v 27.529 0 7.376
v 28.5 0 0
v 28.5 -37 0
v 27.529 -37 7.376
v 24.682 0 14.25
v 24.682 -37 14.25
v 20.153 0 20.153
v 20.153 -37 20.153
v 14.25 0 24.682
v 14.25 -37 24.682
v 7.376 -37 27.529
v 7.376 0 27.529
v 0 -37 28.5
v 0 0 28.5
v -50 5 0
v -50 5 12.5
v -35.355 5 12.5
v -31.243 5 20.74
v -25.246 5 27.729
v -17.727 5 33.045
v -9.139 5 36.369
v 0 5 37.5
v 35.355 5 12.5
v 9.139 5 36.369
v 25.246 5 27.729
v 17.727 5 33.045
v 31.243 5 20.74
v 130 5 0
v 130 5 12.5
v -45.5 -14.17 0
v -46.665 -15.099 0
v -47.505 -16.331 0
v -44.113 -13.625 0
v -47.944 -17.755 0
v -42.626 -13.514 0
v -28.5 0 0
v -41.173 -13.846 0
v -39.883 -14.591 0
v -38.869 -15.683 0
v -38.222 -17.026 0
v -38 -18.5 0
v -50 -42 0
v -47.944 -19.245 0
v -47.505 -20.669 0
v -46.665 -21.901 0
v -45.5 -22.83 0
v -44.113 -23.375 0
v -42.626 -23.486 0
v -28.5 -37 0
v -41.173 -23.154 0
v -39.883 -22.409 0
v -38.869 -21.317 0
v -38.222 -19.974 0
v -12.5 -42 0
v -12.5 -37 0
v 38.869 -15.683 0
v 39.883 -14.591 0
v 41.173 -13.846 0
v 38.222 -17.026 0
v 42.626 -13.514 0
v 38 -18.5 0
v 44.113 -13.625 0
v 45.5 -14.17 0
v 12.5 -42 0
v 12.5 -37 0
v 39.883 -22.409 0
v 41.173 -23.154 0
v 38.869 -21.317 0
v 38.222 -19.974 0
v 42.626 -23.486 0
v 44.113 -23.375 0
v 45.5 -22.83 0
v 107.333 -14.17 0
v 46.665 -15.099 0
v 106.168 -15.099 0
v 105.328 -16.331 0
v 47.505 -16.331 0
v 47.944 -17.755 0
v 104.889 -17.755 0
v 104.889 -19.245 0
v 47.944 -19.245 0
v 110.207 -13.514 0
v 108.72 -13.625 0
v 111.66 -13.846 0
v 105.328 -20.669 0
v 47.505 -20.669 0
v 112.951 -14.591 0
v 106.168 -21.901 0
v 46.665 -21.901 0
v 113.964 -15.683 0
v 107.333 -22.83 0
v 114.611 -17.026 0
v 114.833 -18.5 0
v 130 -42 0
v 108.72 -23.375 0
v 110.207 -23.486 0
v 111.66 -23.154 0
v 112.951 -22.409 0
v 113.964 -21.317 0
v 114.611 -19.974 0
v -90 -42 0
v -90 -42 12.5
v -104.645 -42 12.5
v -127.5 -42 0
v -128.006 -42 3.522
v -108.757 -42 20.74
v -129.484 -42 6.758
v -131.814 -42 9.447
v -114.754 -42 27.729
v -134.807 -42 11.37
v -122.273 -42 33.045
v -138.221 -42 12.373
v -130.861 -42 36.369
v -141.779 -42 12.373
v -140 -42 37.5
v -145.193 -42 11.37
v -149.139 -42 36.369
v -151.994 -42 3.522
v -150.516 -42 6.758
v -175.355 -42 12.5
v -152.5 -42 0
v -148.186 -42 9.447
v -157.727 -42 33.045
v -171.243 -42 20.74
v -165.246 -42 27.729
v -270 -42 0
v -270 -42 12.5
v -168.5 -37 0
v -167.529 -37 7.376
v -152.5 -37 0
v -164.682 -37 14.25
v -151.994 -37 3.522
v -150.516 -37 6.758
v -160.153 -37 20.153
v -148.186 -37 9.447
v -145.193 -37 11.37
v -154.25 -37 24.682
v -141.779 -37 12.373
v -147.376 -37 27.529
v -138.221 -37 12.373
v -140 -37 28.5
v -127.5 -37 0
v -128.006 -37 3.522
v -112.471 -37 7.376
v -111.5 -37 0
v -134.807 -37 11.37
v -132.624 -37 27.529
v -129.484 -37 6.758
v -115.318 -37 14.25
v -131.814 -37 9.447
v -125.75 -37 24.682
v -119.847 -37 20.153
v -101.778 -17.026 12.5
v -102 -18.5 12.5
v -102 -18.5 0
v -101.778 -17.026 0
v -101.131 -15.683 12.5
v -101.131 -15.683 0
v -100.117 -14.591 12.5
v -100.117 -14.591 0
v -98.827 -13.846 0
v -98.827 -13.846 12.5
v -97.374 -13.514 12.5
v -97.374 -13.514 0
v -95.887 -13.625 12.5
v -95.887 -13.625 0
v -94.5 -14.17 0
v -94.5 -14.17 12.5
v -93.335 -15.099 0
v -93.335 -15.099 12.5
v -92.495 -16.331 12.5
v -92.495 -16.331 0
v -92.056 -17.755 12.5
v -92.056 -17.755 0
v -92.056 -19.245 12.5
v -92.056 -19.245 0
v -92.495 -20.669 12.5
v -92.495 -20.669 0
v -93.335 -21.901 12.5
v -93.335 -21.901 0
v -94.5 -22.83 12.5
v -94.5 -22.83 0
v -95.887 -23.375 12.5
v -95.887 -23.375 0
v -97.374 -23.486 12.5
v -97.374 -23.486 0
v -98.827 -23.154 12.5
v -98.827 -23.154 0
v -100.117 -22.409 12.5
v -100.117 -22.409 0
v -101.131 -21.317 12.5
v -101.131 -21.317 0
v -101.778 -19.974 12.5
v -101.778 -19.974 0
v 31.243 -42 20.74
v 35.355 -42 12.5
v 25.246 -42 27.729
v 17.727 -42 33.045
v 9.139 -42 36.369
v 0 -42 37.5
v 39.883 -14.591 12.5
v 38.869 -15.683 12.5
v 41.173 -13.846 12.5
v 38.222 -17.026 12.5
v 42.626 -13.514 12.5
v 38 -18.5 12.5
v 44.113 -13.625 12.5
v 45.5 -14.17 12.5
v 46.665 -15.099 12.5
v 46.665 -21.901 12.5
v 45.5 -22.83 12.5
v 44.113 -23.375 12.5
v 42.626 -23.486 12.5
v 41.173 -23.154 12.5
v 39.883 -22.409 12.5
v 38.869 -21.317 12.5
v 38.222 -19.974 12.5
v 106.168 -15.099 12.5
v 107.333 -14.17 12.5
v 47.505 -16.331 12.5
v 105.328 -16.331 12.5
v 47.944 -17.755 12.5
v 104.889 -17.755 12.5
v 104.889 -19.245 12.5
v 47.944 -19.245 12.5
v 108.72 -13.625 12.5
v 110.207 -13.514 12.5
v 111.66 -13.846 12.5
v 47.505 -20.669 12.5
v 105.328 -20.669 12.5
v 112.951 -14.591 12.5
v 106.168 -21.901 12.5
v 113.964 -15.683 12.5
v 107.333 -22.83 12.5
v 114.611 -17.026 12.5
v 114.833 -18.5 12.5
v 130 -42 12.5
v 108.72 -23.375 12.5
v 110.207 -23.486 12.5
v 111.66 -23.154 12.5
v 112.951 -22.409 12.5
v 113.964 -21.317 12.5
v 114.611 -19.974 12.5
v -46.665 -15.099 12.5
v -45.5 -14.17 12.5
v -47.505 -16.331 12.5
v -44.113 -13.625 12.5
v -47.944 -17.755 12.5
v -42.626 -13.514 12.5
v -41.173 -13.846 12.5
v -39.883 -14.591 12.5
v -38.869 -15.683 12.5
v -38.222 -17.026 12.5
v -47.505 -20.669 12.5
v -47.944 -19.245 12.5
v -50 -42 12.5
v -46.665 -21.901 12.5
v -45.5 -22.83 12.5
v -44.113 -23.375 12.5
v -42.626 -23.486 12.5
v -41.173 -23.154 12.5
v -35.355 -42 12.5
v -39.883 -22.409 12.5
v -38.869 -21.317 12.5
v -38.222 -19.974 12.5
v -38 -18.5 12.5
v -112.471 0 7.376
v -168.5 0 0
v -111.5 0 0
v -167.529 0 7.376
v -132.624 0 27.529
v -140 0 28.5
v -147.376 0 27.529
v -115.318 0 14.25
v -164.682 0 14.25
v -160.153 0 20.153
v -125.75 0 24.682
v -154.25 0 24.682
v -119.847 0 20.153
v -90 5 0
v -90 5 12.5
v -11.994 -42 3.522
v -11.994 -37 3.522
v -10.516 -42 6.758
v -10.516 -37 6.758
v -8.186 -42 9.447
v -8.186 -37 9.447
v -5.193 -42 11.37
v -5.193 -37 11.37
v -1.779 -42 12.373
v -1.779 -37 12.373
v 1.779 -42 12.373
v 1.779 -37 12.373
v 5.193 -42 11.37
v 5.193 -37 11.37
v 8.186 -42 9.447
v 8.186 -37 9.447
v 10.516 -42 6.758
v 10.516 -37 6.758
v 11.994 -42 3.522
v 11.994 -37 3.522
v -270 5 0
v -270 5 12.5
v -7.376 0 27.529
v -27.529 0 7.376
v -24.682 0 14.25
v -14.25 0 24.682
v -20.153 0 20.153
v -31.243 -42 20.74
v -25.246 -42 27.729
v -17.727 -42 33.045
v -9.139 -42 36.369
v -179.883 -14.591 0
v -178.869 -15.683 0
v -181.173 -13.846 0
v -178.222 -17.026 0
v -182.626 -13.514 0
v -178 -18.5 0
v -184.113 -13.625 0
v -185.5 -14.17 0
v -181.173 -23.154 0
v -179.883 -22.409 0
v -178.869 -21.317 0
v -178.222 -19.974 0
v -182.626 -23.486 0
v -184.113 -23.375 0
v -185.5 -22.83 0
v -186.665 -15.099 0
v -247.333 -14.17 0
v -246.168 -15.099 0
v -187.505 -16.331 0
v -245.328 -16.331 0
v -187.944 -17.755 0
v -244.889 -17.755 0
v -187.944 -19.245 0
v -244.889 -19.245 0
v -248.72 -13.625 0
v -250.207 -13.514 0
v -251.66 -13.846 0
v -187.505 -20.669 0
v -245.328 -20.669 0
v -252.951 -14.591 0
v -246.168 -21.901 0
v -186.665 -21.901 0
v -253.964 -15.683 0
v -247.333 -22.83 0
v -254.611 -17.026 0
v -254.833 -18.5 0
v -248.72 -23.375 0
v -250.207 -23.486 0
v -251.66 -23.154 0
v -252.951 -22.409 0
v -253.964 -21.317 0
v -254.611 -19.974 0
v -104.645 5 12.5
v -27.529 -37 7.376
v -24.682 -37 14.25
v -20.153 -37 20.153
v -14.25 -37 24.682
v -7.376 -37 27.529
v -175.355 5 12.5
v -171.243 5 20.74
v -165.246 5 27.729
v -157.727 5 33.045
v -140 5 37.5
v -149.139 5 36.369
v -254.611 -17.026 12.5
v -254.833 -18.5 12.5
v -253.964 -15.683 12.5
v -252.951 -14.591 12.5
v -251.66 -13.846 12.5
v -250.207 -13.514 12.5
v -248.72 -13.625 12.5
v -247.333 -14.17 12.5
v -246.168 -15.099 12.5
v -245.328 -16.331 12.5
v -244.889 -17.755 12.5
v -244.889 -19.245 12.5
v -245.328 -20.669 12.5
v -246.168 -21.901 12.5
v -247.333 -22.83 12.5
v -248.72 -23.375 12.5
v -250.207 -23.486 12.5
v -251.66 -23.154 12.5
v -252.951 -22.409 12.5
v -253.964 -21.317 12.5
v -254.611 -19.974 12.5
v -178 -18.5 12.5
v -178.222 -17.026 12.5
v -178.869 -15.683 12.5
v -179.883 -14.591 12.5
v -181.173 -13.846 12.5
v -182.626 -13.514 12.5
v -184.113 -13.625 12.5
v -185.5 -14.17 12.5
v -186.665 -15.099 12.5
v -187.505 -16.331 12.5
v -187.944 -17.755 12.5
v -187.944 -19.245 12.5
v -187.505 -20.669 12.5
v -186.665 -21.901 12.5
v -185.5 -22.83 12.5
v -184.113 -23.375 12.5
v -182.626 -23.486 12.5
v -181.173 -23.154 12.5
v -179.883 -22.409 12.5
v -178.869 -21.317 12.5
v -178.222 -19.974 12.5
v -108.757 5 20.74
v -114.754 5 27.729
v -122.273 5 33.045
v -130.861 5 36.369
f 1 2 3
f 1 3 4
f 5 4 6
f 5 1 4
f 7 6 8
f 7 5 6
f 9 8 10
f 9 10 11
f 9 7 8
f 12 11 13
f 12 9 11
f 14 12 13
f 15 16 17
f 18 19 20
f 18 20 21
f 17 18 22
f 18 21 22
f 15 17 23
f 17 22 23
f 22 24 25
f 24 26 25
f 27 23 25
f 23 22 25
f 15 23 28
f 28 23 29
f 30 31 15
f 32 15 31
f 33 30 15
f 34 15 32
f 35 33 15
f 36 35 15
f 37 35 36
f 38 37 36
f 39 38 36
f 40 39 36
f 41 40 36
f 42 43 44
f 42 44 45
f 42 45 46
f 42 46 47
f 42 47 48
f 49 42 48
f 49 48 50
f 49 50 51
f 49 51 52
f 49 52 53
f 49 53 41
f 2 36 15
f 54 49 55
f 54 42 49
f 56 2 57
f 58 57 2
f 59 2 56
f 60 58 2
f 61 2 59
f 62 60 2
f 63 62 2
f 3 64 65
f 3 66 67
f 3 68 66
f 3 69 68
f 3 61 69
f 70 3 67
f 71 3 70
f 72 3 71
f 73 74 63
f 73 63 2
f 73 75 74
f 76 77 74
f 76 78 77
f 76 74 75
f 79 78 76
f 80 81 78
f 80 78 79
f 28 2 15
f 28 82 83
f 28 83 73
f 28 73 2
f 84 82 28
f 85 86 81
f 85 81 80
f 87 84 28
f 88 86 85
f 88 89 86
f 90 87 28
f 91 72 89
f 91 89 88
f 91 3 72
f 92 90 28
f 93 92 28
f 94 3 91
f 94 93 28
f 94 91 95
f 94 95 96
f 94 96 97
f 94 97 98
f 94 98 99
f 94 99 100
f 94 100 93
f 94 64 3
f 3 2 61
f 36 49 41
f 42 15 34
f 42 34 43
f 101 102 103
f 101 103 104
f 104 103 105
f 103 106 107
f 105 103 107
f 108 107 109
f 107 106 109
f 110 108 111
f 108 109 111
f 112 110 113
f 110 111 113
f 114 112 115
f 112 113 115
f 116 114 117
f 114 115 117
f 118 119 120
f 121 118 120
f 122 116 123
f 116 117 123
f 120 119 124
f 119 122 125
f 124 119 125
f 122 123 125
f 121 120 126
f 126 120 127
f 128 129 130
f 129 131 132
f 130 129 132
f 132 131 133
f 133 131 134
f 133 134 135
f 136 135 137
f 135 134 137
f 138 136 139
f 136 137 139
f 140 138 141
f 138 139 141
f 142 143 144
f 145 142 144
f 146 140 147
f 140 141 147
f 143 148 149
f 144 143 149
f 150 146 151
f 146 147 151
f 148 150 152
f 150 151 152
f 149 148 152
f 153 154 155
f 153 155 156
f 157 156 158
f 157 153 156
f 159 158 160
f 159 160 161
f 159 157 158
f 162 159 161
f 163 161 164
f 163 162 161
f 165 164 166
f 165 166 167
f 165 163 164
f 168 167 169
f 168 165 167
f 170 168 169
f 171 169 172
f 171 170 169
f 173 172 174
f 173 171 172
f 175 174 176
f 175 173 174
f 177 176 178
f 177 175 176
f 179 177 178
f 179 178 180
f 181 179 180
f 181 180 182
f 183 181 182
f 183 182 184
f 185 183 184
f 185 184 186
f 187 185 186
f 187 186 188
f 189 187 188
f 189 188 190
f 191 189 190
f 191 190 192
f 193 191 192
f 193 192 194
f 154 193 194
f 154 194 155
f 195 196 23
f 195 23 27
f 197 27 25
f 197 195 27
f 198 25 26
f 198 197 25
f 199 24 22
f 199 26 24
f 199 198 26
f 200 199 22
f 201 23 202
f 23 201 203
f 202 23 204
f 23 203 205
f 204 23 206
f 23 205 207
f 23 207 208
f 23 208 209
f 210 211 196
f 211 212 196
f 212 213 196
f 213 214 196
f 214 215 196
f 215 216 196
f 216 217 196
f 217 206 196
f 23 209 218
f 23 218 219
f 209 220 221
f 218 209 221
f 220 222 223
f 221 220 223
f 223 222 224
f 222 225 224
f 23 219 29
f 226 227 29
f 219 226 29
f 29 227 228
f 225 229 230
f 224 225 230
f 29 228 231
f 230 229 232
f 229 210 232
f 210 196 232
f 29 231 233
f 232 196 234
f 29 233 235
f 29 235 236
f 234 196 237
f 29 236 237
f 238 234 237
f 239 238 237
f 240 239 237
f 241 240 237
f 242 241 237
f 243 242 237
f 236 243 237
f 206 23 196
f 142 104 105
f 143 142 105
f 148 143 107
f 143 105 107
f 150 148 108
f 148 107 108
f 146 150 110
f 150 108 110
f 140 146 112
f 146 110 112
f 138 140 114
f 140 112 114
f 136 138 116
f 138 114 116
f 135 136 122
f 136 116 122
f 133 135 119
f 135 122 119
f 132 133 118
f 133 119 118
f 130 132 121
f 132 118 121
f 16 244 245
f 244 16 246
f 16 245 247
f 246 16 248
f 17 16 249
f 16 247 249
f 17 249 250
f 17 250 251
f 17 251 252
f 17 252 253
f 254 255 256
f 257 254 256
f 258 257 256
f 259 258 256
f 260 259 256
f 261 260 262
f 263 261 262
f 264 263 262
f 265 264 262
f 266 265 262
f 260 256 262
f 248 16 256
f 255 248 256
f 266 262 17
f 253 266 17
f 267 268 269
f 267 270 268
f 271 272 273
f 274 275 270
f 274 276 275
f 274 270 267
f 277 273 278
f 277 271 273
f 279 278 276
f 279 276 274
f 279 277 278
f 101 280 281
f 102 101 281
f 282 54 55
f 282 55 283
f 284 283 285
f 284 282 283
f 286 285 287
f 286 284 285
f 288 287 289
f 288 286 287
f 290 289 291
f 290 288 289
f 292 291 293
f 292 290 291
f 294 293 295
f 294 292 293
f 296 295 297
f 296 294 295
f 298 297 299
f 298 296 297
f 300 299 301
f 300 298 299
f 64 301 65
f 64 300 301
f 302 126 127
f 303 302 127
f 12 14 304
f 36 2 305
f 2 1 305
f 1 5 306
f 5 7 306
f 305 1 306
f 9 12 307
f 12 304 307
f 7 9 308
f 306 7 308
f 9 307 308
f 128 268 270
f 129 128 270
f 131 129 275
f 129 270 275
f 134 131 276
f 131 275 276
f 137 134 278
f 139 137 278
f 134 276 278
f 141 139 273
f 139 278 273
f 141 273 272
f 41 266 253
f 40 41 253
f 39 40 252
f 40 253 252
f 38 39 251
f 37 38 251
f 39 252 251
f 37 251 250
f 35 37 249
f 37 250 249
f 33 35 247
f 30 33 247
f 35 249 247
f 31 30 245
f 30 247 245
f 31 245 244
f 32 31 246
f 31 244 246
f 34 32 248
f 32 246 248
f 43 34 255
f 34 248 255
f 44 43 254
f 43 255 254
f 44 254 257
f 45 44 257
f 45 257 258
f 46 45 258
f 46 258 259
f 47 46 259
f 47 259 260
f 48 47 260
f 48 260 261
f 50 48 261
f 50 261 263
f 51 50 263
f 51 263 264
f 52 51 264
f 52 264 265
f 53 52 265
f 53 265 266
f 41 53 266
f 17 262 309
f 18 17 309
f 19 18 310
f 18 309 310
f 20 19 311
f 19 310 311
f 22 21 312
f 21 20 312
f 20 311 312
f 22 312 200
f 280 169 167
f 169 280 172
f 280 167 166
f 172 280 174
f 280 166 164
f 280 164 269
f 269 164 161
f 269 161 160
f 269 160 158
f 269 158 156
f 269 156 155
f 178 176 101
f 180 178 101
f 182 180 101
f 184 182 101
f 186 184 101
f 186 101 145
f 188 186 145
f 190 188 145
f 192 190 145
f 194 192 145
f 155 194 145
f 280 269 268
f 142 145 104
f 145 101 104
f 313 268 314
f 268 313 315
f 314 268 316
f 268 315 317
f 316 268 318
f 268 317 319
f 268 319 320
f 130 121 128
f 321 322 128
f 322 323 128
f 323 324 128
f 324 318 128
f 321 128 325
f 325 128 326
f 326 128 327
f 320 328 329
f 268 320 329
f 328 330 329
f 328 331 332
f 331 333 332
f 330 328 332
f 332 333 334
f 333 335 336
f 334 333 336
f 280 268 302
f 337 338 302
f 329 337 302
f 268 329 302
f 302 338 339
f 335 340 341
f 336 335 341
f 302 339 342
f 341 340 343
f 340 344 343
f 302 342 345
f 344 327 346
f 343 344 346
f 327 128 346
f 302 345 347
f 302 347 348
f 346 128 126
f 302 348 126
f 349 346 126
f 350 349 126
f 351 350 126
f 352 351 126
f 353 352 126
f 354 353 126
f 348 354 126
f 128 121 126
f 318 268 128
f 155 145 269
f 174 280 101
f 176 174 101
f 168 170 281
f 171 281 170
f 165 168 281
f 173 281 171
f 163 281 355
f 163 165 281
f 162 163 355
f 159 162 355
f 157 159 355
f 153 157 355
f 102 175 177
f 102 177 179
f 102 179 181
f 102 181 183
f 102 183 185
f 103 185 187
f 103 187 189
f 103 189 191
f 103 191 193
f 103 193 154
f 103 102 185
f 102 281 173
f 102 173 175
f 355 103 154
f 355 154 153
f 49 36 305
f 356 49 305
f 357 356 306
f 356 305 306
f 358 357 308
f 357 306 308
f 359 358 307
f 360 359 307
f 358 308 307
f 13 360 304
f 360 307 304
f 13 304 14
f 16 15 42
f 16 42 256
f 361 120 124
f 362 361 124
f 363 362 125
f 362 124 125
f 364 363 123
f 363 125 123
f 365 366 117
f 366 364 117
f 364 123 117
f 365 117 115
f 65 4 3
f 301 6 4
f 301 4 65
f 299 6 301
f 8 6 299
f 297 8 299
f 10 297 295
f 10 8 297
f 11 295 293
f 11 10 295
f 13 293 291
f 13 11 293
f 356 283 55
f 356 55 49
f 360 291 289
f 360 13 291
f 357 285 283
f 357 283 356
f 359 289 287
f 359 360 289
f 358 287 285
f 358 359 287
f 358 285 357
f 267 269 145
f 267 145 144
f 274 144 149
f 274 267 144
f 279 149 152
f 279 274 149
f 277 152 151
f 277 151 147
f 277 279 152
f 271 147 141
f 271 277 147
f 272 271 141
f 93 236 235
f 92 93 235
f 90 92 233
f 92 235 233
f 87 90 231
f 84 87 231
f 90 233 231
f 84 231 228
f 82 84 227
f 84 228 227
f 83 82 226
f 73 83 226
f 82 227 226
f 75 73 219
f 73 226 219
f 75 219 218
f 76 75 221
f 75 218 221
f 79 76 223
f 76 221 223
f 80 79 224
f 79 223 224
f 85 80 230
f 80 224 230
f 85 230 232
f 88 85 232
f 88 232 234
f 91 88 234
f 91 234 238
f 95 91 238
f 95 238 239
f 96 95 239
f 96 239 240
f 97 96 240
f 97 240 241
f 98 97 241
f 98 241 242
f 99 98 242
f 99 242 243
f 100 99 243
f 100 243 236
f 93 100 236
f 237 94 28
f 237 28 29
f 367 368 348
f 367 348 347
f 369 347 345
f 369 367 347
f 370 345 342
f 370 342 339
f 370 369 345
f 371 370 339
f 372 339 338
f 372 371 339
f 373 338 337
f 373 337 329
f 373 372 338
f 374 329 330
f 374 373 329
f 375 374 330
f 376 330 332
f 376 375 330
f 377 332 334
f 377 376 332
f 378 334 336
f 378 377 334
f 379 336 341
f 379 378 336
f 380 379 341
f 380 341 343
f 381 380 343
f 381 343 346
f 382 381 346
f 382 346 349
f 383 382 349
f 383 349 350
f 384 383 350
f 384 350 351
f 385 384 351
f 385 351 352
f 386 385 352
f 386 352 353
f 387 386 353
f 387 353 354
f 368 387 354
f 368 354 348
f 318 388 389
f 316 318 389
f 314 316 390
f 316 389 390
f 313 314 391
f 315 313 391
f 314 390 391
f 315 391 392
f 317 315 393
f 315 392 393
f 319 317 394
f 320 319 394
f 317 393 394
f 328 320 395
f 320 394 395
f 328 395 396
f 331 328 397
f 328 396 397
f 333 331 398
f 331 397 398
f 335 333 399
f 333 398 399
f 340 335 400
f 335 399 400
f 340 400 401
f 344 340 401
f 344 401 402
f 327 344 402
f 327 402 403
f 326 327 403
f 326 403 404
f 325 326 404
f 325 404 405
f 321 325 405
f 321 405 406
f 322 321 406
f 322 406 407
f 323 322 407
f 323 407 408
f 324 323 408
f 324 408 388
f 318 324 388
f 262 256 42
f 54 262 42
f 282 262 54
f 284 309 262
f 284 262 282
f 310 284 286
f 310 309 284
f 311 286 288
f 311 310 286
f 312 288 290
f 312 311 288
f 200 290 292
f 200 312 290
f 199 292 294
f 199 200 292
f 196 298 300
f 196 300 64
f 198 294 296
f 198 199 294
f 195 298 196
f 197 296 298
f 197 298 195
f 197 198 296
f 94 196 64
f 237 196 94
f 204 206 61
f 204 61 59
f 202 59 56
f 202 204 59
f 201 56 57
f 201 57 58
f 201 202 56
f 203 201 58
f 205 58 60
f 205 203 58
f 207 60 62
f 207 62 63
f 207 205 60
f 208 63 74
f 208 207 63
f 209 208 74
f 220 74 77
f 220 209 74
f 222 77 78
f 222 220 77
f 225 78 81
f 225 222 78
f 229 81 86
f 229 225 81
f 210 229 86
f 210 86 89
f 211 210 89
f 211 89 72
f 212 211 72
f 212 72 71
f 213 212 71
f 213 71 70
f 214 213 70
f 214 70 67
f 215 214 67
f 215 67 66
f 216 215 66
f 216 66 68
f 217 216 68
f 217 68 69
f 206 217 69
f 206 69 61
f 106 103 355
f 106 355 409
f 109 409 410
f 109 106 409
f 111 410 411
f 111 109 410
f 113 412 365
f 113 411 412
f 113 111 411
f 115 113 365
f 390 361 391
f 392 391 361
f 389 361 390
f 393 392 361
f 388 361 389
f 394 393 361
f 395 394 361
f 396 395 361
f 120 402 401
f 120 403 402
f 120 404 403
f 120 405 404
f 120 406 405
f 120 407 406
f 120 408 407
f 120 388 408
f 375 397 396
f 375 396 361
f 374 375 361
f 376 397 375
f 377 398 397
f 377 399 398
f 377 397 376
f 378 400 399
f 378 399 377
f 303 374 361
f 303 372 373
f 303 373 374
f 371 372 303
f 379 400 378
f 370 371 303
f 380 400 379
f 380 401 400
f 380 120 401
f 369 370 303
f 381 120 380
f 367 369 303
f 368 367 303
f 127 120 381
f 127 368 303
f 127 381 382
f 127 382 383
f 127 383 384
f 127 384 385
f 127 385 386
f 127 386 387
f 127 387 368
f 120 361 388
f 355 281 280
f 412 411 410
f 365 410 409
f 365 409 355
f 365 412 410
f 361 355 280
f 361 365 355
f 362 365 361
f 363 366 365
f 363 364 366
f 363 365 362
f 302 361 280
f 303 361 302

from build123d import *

# Parameters (mm, degrees)
F1_DEPTH  = 37
F2_DEPTH  = 5
F4_W      = 50
F4_H      = 50
F5_DEPTH  = 5
F7_R      = 5
F8_DEPTH  = 100
F9_R      = 12.5
F10_DEPTH = 5
F12_DEPTH = 55
F14_W     = 80
F14_H     = 12.5
F15_DEPTH = 47
F16_R     = 5
F17_DEPTH = 25


with BuildPart() as f1:
    # F0 (on Front) → F1 (new body)
    with BuildSketch(Plane.XZ):
        with BuildLine():
            Line((-50, 0), (-28.5, 0))
            ThreePointArc((-28.5, 0), (-20.1525432638, 20.1525432638), (0, 28.5))
            Line((0, 28.5), (0, 50))
            Line((0, 50), (-50, 50))
            Line((-50, 50), (-50, 0))
        make_face()
    extrude(amount=F1_DEPTH)

    # F0 (on Front) → F2 (join)
    with BuildSketch(Plane.XZ):
        with BuildLine():
            Line((-28.5, 0), (0, 0))
            Line((0, 0), (0, 28.5))
            ThreePointArc((0, 28.5), (-20.1525432638, 20.1525432638), (-28.5, 0))
        make_face()
        with BuildLine():
            Line((-50, 0), (-28.5, 0))
            ThreePointArc((-28.5, 0), (-20.1525432638, 20.1525432638), (0, 28.5))
            Line((0, 28.5), (0, 50))
            Line((0, 50), (-50, 50))
            Line((-50, 50), (-50, 0))
        make_face()
    extrude(amount=-F2_DEPTH)

    # F4 (on offset) → F5 (join)
    with BuildSketch(Plane.XZ.offset(37)):
        with Locations((-25, 25)):
            Rectangle(F4_W, F4_H)
    extrude(amount=F5_DEPTH)

    # F6: union 

    # F7 (on face) → F8 (cut)
    with BuildSketch(Plane.XY.offset(50)):
        with Locations((-43, -18.5)):
            Circle(F7_R)
    extrude(amount=-F8_DEPTH, mode=Mode.SUBTRACT)

    # F9 (on face) → F10 (cut)
    with BuildSketch(Plane.XZ.offset(42)):
        Circle(F9_R)
    extrude(amount=-F10_DEPTH, mode=Mode.SUBTRACT)

    # F11 (on face) → F12 (cut)
    with BuildSketch(Plane.XZ.offset(42)):
        with BuildLine():
            ThreePointArc((-35.3553390593, 12.5), (-21.6506350946, 30.6186217848), (0, 37.5))
            Line((0, 37.5), (0, 50))
            Line((0, 50), (-50, 50))
            Line((-50, 50), (-50, 12.5))
            Line((-50, 12.5), (-35.3553390593, 12.5))
        make_face()
    extrude(amount=-F12_DEPTH, mode=Mode.SUBTRACT)

    # F13: F1 across plane


with BuildPart() as f1_1:
    add(f1.part)
    add(f1.part.mirror(Plane.YZ))

    # F14 (on face) → F15 (join)
    with BuildSketch(Plane.XZ.offset(42)):
        with Locations((90, 6.25)):
            Rectangle(F14_W, F14_H)
    extrude(amount=-F15_DEPTH)

    # F16 (on face) → F17 (cut)
    with BuildSketch(Plane.XY.offset(12.5)):
        with Locations((109.8330691457, -18.5)):
            Circle(F16_R)
    extrude(amount=-F17_DEPTH, mode=Mode.SUBTRACT)


with BuildPart() as f19_1:
    # F19: instance of F1
    add(f1_1.part.mirror(Plane.YZ.offset(-70)))


solid = Compound([f1_1.part, f19_1.part])
